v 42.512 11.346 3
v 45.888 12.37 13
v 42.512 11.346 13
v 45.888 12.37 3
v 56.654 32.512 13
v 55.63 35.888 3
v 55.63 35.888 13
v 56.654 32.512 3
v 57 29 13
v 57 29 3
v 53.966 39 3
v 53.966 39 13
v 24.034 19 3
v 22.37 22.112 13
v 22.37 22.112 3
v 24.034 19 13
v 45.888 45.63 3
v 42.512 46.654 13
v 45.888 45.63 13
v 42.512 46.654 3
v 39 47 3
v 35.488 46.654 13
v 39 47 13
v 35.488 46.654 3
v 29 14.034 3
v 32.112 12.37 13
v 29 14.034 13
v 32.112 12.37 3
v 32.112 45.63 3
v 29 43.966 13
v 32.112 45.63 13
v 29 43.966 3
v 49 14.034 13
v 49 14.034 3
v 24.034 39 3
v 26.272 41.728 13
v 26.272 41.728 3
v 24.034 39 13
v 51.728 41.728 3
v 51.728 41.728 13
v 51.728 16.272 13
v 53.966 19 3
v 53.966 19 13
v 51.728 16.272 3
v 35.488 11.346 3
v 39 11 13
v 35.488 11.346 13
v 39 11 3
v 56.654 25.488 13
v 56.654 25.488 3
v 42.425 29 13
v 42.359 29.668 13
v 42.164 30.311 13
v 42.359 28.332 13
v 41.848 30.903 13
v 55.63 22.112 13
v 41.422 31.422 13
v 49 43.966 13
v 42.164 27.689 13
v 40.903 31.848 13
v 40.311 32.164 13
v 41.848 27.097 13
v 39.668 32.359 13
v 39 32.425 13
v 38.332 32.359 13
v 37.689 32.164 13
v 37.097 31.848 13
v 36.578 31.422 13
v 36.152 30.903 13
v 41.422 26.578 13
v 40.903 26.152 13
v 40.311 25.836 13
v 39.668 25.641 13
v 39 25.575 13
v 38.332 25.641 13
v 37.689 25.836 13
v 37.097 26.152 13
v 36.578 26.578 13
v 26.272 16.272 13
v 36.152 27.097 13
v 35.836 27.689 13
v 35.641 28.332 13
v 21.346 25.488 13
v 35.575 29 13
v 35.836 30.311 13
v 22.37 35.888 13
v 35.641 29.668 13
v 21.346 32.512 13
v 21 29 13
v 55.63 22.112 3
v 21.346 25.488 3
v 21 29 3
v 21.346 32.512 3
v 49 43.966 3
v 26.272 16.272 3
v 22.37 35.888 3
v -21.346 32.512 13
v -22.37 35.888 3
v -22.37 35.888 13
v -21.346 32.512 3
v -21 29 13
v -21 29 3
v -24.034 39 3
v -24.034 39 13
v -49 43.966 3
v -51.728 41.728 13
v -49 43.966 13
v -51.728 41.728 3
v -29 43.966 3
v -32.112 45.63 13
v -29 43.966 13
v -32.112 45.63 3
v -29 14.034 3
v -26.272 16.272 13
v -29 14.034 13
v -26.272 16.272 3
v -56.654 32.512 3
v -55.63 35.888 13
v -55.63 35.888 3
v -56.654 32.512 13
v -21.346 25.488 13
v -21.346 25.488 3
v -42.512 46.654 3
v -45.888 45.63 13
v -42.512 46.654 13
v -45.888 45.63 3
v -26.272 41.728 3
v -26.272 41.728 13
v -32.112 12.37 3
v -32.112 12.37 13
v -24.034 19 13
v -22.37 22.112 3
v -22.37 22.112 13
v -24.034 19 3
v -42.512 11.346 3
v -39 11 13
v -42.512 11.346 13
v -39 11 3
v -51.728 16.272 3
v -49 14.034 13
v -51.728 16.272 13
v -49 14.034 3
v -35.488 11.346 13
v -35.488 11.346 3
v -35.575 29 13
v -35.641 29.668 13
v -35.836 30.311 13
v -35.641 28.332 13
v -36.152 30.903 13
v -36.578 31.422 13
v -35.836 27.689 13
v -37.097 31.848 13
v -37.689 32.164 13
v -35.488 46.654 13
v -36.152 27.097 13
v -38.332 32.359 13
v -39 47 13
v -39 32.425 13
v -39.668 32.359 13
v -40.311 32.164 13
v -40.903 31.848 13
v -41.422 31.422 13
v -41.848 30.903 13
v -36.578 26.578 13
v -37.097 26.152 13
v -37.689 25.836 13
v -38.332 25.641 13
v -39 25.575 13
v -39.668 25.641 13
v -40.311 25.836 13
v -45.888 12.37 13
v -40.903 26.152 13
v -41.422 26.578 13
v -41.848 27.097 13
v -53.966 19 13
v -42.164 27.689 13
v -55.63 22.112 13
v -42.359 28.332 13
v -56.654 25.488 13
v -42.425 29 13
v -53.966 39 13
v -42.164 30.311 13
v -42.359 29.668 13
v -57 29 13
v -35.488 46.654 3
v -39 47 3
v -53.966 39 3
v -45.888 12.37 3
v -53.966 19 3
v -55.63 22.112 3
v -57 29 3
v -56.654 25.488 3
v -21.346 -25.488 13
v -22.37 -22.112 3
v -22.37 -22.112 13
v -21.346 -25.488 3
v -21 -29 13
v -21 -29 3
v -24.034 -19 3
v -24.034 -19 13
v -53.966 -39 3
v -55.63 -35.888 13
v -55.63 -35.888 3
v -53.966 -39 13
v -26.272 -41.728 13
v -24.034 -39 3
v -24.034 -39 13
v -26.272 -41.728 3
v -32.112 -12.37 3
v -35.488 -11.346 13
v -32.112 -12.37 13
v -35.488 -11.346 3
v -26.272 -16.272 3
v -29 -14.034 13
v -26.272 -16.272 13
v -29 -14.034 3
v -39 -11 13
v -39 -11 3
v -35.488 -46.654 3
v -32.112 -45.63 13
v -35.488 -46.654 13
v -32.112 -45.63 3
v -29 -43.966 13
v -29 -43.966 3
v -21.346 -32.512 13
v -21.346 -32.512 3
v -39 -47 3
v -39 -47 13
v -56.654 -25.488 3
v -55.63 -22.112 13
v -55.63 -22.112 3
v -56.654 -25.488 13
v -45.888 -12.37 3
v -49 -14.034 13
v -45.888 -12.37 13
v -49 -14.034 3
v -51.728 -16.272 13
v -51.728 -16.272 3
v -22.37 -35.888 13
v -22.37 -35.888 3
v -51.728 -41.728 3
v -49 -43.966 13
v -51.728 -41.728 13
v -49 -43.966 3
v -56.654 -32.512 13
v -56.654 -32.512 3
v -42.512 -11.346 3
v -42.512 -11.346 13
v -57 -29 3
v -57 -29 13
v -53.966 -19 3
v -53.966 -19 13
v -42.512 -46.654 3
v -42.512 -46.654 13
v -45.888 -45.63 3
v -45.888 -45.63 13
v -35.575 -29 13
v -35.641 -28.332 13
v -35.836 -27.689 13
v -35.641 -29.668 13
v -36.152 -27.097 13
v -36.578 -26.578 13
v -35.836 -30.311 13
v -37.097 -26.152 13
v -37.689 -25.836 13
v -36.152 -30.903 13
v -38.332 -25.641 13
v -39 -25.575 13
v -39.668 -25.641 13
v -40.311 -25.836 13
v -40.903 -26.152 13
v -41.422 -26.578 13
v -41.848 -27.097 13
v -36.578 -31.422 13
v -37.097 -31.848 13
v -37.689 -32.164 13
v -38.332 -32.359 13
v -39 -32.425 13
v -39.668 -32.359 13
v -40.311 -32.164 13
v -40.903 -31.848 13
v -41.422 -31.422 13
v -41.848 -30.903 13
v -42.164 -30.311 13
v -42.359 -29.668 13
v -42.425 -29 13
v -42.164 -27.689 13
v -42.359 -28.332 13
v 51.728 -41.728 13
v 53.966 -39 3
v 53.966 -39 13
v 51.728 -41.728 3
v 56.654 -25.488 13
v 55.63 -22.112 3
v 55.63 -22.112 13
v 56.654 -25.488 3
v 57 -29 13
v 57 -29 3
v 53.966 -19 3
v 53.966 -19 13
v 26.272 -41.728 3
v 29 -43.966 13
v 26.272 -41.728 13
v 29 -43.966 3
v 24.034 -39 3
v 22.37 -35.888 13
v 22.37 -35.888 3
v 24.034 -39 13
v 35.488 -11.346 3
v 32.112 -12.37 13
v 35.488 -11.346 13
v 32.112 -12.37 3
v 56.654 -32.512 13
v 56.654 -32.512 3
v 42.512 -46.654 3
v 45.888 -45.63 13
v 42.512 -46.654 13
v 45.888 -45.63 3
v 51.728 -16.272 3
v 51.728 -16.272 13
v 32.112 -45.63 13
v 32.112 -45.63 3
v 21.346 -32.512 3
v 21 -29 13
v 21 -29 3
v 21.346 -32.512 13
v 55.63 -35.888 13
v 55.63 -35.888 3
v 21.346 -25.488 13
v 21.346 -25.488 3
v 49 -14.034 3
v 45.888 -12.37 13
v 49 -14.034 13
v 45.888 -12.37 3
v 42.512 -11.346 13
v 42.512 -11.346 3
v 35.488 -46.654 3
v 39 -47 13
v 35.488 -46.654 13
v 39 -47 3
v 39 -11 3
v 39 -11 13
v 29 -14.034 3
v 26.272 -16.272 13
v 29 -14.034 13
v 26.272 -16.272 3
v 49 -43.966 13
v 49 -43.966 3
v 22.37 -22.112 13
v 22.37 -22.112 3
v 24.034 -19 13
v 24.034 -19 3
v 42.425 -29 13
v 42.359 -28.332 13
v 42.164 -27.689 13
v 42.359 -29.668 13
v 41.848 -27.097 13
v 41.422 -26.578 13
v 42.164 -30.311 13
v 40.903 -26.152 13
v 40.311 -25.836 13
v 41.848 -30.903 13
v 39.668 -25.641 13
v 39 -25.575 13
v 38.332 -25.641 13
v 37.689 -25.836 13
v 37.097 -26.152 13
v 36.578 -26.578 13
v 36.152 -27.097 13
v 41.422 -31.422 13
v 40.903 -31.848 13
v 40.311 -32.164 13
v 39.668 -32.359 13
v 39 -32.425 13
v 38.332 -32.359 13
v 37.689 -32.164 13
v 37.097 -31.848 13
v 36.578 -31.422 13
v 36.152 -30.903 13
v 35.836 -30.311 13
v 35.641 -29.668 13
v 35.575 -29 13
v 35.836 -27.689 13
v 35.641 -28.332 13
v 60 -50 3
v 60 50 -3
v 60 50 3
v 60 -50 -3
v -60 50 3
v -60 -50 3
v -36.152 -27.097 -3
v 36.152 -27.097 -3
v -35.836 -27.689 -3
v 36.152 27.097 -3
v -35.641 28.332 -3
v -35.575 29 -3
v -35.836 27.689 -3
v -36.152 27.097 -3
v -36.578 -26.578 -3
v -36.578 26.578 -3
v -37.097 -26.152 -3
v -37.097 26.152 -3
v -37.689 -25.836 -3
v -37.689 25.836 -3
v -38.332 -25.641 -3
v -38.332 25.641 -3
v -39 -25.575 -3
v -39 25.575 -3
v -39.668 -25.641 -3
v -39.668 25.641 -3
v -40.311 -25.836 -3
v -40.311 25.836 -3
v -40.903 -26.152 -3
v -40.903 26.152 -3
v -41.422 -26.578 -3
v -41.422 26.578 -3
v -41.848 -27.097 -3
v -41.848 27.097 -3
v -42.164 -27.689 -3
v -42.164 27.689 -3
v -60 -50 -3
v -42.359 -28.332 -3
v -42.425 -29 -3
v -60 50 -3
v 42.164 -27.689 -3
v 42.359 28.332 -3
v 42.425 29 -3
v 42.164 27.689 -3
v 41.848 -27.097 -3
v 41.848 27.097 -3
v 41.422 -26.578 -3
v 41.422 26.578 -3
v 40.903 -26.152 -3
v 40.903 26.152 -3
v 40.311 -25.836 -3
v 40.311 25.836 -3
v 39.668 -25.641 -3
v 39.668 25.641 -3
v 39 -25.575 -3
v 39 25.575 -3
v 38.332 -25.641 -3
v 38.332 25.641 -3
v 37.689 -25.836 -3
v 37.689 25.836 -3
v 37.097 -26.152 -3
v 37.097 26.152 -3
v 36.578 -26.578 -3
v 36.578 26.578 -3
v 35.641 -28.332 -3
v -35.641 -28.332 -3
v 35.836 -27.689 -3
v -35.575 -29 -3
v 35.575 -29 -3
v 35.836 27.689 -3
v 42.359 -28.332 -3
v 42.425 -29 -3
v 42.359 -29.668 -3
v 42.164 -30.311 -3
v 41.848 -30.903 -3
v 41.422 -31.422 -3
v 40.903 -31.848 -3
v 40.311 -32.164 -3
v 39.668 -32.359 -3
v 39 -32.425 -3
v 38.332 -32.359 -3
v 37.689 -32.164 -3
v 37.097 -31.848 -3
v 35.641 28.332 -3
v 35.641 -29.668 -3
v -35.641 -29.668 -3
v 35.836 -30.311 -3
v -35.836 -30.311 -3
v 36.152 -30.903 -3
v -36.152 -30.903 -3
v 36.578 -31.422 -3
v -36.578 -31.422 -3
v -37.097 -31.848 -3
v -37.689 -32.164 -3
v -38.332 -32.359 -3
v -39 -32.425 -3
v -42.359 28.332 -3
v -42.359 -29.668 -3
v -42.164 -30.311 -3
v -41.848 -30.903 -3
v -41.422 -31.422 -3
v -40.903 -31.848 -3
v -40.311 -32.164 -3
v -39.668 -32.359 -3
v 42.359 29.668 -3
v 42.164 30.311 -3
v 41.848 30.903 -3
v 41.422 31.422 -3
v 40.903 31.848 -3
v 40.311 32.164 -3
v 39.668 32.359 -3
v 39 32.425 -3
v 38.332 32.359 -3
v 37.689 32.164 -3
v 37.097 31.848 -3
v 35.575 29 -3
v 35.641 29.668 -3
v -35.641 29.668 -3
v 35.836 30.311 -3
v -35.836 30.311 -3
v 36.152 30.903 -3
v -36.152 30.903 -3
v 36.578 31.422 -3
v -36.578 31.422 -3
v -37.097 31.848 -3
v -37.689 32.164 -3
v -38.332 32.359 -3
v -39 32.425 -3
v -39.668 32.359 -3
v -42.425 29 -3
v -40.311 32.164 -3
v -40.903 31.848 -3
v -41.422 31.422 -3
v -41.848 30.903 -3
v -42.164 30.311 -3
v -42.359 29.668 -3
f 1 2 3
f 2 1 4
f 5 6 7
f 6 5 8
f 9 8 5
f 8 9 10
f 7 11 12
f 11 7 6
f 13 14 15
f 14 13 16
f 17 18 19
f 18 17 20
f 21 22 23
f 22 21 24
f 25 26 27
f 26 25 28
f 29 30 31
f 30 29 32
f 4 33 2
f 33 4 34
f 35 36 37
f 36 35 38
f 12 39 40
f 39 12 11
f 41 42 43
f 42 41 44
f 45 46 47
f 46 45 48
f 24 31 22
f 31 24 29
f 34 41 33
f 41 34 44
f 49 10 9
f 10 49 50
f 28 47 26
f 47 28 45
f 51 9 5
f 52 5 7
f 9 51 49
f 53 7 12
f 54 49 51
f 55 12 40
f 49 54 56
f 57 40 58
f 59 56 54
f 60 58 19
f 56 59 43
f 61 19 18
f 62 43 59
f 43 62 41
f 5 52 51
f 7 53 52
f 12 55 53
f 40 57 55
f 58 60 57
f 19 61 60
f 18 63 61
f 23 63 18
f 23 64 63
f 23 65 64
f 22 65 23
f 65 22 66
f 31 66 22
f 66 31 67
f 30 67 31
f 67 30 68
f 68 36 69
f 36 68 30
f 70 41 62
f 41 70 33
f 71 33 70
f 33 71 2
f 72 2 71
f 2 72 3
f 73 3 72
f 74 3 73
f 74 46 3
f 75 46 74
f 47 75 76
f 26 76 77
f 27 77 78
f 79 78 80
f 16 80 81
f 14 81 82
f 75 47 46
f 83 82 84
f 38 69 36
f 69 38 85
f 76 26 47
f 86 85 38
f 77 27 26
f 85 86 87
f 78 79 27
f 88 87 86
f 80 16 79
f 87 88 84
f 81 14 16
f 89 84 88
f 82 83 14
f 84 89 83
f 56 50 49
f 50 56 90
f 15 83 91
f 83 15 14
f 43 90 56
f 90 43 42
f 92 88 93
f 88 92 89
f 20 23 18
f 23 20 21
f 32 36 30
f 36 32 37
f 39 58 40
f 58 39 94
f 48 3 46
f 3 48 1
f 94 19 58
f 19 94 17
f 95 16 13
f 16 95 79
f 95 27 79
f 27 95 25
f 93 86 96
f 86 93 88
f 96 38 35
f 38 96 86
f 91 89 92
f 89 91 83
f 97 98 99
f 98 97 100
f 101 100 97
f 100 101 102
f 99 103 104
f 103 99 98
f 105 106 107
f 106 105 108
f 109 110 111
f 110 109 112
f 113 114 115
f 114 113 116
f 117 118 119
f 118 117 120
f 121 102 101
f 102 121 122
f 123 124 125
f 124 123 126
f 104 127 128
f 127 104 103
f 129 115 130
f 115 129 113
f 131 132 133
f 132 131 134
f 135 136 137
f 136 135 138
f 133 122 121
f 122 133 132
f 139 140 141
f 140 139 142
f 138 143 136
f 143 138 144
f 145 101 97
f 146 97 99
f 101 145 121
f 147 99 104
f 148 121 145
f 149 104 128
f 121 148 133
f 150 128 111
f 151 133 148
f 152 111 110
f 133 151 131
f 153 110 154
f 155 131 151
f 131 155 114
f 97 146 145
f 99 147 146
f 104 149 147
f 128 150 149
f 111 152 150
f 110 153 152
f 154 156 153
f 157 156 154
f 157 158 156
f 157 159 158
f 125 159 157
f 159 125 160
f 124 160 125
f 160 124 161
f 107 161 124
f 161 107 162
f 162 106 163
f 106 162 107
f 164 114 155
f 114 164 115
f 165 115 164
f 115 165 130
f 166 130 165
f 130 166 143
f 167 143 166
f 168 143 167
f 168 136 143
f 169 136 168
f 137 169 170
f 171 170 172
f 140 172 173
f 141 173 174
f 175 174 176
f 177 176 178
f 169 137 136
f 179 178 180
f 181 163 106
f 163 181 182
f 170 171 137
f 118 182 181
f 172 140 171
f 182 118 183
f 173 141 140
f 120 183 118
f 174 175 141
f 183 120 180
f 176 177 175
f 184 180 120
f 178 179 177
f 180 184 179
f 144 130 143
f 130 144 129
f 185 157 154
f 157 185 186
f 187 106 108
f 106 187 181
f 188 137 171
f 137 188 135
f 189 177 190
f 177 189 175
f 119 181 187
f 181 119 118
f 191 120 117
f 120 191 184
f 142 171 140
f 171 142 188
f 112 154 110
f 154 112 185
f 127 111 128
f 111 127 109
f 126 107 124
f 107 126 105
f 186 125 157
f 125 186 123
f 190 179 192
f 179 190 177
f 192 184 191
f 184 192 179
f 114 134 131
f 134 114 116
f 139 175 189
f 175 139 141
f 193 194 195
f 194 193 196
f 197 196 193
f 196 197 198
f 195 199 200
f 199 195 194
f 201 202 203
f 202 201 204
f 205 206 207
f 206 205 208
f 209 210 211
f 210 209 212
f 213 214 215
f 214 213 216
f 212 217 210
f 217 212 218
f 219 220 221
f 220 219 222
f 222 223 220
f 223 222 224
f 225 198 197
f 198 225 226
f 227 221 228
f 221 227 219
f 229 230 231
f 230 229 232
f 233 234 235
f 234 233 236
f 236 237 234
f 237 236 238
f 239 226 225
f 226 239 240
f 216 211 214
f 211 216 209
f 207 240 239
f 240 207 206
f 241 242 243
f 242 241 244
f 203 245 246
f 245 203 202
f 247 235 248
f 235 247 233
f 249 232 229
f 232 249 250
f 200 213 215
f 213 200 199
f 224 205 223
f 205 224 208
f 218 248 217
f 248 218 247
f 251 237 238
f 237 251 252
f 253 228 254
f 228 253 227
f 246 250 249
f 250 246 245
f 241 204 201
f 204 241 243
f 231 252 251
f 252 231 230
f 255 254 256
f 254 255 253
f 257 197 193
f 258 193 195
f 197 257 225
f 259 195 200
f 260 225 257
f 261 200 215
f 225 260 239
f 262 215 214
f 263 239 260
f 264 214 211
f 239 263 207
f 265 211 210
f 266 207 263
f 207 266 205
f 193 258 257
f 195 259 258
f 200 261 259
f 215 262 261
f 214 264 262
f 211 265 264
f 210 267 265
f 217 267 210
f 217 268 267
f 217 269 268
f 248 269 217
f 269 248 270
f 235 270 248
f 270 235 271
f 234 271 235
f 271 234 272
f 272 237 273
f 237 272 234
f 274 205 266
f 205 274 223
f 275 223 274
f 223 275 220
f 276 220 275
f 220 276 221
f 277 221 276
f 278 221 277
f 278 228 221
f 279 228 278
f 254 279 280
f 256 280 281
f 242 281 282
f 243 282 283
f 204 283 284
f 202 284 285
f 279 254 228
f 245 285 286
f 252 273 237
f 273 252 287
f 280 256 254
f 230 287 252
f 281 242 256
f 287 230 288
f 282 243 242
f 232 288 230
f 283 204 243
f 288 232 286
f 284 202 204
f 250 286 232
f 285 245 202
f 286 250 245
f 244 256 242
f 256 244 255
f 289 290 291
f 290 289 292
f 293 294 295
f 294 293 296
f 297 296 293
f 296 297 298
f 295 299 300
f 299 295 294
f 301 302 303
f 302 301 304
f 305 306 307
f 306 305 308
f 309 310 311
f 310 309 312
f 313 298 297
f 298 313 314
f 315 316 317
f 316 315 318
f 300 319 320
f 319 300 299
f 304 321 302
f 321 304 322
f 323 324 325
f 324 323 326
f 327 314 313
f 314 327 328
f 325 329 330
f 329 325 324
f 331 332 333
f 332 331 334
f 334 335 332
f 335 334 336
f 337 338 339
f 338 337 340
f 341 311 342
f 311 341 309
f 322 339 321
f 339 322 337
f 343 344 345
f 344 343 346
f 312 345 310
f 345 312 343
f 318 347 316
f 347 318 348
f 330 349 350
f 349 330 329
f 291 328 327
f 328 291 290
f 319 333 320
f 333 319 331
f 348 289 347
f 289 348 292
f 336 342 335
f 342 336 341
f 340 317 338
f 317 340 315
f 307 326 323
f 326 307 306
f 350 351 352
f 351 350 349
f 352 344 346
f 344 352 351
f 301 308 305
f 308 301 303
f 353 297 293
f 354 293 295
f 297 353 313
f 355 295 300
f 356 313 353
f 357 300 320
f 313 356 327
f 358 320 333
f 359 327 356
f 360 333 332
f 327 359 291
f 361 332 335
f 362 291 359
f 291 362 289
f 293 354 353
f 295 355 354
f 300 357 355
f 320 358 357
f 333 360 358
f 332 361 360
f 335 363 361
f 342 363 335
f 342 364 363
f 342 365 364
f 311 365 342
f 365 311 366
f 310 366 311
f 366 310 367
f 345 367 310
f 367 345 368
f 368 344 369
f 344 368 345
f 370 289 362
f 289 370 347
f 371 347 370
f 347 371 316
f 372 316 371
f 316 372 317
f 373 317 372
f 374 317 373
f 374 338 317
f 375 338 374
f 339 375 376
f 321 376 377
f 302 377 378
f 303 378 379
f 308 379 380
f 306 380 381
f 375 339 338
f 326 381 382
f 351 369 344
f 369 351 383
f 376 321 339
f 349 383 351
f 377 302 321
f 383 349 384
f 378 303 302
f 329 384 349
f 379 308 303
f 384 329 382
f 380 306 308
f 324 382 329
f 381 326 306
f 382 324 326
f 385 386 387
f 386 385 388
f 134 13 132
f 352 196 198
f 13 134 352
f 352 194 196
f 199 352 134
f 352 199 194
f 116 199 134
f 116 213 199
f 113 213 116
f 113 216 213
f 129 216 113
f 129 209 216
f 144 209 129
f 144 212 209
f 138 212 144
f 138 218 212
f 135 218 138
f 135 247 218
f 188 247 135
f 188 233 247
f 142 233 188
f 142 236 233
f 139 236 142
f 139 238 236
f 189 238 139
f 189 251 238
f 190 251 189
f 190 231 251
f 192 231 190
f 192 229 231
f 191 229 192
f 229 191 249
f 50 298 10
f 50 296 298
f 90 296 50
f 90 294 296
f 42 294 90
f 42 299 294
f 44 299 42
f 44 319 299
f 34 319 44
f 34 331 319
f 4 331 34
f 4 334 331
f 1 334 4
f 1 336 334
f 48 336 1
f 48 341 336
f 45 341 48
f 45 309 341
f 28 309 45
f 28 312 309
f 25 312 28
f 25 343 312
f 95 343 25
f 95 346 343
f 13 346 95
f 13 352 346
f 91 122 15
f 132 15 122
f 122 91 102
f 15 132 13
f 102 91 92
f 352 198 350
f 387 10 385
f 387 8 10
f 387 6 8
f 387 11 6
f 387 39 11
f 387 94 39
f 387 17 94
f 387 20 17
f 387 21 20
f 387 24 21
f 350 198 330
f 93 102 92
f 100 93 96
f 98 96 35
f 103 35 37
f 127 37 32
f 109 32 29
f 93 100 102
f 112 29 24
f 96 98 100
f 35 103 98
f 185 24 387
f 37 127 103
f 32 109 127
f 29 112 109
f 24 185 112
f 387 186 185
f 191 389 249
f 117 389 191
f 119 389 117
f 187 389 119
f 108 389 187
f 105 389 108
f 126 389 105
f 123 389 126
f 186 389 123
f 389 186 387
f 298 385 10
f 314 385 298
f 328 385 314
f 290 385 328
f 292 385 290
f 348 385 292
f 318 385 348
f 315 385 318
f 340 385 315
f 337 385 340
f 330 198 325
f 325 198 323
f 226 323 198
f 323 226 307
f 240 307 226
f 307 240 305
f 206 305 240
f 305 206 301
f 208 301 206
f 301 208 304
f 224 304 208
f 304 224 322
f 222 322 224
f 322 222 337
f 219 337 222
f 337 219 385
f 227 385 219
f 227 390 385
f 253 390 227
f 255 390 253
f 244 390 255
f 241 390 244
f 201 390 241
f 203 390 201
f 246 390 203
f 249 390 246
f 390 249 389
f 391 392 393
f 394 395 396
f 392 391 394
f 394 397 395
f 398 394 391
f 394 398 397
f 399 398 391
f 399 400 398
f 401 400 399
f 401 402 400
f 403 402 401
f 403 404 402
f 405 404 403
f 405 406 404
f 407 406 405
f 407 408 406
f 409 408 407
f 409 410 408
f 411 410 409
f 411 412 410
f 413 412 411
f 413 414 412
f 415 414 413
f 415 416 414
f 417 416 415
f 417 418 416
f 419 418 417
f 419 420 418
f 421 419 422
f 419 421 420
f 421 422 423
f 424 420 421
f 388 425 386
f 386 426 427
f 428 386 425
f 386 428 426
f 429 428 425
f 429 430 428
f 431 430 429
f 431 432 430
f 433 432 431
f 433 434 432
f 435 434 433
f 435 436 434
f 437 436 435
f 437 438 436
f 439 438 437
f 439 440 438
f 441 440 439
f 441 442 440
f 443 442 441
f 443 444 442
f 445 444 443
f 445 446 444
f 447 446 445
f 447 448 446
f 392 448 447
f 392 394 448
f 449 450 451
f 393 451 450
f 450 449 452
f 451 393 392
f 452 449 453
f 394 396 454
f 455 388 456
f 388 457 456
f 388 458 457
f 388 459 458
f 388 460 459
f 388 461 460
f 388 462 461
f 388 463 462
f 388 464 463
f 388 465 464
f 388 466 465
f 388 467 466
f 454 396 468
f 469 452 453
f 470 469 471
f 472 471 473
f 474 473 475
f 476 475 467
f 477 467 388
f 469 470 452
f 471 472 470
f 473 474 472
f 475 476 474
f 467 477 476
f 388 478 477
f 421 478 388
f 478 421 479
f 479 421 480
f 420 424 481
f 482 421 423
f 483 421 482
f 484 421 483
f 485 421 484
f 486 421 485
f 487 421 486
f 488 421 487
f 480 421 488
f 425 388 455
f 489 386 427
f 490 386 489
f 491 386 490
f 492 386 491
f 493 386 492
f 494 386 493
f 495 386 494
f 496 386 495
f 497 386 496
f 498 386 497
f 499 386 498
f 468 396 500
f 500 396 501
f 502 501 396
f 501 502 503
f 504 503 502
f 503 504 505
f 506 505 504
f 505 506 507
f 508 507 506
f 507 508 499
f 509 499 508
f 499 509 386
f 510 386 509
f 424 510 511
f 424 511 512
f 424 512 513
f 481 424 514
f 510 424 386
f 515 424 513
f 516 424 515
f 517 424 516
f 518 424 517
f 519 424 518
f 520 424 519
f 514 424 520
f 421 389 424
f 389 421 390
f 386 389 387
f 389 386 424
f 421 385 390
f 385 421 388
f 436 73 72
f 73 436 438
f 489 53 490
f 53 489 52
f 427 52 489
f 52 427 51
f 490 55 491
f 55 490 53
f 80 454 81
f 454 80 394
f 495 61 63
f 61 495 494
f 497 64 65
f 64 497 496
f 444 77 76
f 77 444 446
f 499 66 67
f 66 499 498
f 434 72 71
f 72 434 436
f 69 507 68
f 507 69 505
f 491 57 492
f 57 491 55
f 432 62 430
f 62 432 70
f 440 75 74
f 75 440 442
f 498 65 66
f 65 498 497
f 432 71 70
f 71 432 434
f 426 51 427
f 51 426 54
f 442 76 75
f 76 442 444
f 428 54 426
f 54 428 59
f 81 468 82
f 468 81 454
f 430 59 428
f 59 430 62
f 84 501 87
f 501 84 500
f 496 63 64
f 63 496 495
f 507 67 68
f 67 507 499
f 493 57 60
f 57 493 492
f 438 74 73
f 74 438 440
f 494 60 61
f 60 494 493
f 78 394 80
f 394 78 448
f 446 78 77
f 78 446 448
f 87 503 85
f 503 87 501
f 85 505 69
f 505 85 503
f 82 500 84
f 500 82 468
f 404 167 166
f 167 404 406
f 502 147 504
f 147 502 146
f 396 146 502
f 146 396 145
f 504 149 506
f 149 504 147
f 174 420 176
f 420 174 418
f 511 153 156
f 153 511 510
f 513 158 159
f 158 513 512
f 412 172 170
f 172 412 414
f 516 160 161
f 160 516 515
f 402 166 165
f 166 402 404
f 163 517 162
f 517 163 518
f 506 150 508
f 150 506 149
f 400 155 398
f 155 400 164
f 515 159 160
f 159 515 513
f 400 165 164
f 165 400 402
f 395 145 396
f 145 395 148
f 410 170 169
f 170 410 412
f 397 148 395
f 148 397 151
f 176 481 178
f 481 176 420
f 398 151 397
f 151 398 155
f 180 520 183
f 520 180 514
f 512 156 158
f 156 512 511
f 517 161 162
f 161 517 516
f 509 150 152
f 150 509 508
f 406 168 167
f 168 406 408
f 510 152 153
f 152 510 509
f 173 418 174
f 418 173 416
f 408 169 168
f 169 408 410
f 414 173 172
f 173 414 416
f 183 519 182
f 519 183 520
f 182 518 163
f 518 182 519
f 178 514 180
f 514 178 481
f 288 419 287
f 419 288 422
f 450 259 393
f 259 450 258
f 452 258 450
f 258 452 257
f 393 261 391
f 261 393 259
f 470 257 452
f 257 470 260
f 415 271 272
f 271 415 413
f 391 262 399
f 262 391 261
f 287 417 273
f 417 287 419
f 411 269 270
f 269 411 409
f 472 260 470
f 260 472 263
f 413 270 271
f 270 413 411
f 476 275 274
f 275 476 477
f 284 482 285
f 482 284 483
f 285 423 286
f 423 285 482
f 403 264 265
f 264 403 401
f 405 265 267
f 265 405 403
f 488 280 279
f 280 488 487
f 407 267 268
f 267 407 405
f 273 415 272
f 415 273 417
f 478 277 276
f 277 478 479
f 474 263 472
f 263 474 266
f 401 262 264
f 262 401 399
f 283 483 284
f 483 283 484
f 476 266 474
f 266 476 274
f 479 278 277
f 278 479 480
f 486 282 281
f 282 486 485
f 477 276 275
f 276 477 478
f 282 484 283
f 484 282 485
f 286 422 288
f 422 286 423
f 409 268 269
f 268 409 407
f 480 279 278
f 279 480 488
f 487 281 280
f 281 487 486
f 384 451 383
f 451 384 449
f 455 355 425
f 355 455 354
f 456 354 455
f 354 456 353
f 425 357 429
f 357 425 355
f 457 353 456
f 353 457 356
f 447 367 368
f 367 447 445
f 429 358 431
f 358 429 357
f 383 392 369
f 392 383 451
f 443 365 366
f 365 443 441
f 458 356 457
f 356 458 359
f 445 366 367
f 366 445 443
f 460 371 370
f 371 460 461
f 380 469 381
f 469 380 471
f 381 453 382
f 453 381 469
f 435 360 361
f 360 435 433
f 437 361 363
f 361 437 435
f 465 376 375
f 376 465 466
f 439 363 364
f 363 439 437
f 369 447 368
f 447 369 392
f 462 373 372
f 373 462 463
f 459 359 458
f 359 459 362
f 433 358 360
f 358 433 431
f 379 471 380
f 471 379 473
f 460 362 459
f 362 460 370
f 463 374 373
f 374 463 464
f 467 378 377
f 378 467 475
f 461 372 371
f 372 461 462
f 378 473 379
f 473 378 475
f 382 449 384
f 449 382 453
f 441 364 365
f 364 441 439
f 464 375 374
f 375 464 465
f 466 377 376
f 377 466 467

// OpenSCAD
$fn = 32;

// ----------------------------------------------------------------------
// Anchor pads 120 x 100 x 16
// four corner bosses with anchor holes
// ----------------------------------------------------------------------

// --- parameters (mm) ---
plate = [120, 100, 6];   // base plate size (x, y, z)
pads = 4;                // boss count, one per corner
edge = 21;               // boss centre offset from the plate edge
boss_d = 36;             // boss diameter
boss_h = 10;             // boss height above the base plate
bore_d = 6.6;            // nominal hole diameter from the drawing
print_allowance = 0.25;  // clearance added for printing

// --- derived feature positions (mm) ---
hole_d = bore_d + print_allowance;  // = 6.85   hole diameter as printed
height = plate[2] + boss_h;         // = 16   overall height of the part
corner_x = plate[0] / 2 - edge;     // = 39   boss centre X
corner_y = plate[1] / 2 - edge;     // = 29   boss centre Y
feature_centers = [
  [corner_x, corner_y],
  [-corner_x, corner_y],
  [-corner_x, -corner_y],
  [corner_x, -corner_y]
];   // boss centres, anchor holes are drilled there

// base plate, four bosses standing on it, anchor holes all the way through
difference() {
  union() {
    cube(plate, center = true);
    for (centre = feature_centers)
      translate([centre[0], centre[1], plate[2] / 2 - 1])
        cylinder(d = boss_d, h = boss_h + 1);
  }
  for (centre = feature_centers)
    translate([centre[0], centre[1], -height])
      cylinder(d = hole_d, h = 2 * height + 2);  // through boss and plate
}
